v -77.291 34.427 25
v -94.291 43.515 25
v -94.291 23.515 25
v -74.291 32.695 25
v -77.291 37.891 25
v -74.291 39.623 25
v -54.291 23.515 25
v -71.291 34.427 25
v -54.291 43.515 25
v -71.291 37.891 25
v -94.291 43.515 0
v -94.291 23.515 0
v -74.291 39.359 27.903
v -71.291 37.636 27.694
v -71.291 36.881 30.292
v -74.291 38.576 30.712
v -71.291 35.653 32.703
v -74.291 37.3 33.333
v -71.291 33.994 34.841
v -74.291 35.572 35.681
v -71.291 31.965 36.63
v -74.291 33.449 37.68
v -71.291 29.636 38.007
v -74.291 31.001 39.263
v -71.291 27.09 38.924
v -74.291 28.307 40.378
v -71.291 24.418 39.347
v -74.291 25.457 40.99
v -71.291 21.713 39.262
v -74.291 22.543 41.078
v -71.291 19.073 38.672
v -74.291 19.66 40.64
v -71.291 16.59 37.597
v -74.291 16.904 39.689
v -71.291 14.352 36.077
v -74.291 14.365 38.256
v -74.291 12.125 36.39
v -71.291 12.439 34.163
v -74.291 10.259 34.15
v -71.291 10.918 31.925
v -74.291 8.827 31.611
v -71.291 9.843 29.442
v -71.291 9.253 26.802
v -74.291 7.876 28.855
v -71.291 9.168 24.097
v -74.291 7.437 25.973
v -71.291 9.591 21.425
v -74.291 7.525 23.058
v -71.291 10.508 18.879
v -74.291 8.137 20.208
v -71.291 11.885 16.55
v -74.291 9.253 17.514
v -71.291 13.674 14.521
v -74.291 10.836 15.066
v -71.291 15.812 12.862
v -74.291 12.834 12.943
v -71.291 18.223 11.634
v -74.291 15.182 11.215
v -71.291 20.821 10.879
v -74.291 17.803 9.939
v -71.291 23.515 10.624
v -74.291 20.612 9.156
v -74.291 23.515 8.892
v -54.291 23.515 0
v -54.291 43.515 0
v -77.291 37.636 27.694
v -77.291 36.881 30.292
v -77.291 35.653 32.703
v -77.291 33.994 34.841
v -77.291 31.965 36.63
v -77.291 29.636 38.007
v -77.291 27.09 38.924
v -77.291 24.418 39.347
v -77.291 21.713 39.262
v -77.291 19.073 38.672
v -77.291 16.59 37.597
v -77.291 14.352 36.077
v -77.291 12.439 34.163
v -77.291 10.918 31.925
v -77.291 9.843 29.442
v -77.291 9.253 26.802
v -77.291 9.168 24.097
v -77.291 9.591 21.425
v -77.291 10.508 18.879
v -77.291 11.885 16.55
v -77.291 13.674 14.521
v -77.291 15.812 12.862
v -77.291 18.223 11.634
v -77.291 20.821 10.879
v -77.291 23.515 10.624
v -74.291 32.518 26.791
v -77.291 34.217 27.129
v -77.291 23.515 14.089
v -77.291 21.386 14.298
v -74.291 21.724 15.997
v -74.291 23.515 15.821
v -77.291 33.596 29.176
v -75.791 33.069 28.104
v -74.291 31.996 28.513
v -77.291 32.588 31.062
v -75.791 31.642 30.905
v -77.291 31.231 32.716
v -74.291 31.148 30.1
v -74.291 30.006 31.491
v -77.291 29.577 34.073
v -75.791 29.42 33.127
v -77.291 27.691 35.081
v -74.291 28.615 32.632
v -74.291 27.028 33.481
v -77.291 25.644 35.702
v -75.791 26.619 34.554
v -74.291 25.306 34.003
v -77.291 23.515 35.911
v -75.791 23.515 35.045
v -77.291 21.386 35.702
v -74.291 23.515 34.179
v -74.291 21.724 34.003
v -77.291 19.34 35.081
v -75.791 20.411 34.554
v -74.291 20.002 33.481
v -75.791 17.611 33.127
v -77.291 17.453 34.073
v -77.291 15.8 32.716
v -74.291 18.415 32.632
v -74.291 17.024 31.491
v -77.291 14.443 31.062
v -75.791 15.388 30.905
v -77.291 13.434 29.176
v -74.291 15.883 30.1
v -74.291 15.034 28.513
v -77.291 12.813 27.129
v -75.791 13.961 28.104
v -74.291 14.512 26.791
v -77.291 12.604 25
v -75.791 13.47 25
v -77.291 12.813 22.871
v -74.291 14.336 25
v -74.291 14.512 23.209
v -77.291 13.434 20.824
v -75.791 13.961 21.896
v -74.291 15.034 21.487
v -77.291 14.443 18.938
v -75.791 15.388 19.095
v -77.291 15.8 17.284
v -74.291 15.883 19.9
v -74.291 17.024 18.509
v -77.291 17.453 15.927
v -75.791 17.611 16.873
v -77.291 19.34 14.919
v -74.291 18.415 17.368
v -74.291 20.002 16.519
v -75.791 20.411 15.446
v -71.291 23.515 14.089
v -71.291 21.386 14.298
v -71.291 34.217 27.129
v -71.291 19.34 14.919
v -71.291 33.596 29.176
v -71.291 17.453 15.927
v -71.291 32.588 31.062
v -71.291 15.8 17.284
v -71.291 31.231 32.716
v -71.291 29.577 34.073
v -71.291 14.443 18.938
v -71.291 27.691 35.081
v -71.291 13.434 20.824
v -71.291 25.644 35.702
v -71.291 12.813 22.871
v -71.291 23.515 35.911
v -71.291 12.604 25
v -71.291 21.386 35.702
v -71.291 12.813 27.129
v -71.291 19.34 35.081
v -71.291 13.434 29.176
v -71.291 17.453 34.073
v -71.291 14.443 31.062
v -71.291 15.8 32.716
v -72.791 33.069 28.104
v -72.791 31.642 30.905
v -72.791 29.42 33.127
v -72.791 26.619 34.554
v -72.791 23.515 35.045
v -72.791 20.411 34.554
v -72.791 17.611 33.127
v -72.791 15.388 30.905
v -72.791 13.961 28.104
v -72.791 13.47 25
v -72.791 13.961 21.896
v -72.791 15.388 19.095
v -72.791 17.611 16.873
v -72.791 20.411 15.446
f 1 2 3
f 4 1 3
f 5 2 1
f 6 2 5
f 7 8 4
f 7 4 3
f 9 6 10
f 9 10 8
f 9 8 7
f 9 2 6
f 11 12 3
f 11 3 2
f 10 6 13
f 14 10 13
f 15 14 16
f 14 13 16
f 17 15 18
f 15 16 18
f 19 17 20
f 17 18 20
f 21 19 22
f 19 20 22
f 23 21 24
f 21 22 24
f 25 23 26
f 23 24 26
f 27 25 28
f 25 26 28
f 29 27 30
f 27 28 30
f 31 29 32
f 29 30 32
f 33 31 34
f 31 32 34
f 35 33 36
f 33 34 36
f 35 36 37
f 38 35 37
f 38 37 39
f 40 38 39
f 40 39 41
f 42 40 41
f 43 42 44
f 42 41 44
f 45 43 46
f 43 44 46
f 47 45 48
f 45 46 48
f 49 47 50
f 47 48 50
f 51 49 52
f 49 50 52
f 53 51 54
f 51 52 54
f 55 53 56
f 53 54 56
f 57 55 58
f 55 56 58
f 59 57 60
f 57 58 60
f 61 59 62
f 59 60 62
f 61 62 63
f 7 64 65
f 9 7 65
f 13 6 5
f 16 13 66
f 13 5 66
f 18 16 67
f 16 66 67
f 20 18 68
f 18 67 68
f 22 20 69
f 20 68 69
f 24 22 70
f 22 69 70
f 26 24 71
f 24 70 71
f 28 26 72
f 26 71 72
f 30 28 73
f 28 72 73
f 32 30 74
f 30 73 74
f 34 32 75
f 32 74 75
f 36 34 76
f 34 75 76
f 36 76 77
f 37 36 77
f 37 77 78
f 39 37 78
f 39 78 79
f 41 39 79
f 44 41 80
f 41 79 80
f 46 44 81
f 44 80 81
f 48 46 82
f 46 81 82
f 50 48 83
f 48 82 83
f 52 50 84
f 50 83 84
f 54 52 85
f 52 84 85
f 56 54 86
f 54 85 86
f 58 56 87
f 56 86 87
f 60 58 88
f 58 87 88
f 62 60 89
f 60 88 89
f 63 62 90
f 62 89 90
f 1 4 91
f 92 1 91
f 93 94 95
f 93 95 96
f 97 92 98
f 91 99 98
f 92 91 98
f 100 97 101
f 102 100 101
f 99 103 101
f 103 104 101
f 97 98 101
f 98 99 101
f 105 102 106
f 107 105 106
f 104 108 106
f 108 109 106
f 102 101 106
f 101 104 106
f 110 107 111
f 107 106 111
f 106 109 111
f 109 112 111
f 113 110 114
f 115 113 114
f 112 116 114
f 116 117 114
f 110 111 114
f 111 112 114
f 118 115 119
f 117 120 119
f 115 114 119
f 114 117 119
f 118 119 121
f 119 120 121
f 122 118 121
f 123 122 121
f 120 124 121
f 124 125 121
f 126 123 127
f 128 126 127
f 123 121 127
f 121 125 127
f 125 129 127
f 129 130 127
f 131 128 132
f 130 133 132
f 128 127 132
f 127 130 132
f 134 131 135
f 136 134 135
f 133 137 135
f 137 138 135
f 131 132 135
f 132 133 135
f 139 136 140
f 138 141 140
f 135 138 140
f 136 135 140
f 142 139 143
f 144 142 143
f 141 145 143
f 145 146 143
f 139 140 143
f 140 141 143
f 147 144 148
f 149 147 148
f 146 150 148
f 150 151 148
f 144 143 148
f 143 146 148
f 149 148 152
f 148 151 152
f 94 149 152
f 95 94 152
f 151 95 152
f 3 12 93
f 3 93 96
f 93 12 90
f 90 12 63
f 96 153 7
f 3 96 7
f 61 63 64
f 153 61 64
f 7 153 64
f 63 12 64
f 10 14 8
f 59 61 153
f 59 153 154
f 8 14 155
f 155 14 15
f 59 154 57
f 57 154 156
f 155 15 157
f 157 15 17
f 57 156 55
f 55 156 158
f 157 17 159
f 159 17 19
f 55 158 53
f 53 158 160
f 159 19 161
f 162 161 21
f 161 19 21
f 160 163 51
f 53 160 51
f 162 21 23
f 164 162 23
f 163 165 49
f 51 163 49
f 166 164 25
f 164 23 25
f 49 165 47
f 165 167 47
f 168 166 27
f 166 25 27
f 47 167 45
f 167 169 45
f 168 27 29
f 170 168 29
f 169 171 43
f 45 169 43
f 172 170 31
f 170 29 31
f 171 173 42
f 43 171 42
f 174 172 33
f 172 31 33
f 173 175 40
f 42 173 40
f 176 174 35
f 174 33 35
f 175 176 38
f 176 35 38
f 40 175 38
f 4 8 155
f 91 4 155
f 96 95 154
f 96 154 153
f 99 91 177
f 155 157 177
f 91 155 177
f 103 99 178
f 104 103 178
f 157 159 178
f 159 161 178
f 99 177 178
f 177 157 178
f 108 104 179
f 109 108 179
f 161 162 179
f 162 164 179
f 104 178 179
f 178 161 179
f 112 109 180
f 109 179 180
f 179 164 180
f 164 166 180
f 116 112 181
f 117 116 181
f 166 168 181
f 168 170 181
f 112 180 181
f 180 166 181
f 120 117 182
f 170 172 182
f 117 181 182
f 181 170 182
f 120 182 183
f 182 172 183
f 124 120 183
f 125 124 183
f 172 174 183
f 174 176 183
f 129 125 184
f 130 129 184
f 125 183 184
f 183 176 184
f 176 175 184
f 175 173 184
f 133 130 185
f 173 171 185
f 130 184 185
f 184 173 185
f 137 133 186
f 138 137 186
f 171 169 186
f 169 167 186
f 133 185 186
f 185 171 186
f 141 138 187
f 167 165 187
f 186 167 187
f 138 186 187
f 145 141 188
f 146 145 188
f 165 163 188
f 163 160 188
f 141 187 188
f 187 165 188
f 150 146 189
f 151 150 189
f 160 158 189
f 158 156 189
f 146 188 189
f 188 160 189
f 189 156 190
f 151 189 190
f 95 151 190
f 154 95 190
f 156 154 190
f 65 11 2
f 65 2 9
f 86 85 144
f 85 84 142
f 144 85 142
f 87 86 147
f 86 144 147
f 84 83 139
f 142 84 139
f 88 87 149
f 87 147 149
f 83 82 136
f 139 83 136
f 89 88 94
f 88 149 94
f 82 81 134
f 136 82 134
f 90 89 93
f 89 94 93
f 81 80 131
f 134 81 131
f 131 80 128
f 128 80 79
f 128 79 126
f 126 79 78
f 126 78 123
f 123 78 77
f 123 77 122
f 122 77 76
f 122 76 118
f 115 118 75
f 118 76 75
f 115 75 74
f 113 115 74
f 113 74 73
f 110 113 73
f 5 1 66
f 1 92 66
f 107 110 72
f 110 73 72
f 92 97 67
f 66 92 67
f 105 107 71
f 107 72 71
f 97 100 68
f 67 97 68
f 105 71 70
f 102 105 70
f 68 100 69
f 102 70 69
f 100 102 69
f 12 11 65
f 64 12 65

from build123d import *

# Parameters (mm, degrees)
F0_W     = 40
F0_H     = 20
F1_DEPTH = 25


with BuildPart() as f1:
    # F0 (on Top) → F1 (new body)
    with BuildSketch(Plane.XY):
        with Locations((-74.290519, 33.515131)):
            Rectangle(F0_W, F0_H)
    extrude(amount=F1_DEPTH)

    # F2 (on face) → F3 (revolve)
    with BuildSketch(Plane.XY.offset(25)):
        Polygon((-71.290519, 37.890665), (-74.290519, 39.622715), (-77.290519, 37.890665), (-77.290519, 34.426563), (-74.290519, 32.694512), (-71.290519, 34.426563), align=None)
    revolve(axis=Axis((-74.290519, 23.515131, 25), (1, 0, 0)))


solid = f1.part
